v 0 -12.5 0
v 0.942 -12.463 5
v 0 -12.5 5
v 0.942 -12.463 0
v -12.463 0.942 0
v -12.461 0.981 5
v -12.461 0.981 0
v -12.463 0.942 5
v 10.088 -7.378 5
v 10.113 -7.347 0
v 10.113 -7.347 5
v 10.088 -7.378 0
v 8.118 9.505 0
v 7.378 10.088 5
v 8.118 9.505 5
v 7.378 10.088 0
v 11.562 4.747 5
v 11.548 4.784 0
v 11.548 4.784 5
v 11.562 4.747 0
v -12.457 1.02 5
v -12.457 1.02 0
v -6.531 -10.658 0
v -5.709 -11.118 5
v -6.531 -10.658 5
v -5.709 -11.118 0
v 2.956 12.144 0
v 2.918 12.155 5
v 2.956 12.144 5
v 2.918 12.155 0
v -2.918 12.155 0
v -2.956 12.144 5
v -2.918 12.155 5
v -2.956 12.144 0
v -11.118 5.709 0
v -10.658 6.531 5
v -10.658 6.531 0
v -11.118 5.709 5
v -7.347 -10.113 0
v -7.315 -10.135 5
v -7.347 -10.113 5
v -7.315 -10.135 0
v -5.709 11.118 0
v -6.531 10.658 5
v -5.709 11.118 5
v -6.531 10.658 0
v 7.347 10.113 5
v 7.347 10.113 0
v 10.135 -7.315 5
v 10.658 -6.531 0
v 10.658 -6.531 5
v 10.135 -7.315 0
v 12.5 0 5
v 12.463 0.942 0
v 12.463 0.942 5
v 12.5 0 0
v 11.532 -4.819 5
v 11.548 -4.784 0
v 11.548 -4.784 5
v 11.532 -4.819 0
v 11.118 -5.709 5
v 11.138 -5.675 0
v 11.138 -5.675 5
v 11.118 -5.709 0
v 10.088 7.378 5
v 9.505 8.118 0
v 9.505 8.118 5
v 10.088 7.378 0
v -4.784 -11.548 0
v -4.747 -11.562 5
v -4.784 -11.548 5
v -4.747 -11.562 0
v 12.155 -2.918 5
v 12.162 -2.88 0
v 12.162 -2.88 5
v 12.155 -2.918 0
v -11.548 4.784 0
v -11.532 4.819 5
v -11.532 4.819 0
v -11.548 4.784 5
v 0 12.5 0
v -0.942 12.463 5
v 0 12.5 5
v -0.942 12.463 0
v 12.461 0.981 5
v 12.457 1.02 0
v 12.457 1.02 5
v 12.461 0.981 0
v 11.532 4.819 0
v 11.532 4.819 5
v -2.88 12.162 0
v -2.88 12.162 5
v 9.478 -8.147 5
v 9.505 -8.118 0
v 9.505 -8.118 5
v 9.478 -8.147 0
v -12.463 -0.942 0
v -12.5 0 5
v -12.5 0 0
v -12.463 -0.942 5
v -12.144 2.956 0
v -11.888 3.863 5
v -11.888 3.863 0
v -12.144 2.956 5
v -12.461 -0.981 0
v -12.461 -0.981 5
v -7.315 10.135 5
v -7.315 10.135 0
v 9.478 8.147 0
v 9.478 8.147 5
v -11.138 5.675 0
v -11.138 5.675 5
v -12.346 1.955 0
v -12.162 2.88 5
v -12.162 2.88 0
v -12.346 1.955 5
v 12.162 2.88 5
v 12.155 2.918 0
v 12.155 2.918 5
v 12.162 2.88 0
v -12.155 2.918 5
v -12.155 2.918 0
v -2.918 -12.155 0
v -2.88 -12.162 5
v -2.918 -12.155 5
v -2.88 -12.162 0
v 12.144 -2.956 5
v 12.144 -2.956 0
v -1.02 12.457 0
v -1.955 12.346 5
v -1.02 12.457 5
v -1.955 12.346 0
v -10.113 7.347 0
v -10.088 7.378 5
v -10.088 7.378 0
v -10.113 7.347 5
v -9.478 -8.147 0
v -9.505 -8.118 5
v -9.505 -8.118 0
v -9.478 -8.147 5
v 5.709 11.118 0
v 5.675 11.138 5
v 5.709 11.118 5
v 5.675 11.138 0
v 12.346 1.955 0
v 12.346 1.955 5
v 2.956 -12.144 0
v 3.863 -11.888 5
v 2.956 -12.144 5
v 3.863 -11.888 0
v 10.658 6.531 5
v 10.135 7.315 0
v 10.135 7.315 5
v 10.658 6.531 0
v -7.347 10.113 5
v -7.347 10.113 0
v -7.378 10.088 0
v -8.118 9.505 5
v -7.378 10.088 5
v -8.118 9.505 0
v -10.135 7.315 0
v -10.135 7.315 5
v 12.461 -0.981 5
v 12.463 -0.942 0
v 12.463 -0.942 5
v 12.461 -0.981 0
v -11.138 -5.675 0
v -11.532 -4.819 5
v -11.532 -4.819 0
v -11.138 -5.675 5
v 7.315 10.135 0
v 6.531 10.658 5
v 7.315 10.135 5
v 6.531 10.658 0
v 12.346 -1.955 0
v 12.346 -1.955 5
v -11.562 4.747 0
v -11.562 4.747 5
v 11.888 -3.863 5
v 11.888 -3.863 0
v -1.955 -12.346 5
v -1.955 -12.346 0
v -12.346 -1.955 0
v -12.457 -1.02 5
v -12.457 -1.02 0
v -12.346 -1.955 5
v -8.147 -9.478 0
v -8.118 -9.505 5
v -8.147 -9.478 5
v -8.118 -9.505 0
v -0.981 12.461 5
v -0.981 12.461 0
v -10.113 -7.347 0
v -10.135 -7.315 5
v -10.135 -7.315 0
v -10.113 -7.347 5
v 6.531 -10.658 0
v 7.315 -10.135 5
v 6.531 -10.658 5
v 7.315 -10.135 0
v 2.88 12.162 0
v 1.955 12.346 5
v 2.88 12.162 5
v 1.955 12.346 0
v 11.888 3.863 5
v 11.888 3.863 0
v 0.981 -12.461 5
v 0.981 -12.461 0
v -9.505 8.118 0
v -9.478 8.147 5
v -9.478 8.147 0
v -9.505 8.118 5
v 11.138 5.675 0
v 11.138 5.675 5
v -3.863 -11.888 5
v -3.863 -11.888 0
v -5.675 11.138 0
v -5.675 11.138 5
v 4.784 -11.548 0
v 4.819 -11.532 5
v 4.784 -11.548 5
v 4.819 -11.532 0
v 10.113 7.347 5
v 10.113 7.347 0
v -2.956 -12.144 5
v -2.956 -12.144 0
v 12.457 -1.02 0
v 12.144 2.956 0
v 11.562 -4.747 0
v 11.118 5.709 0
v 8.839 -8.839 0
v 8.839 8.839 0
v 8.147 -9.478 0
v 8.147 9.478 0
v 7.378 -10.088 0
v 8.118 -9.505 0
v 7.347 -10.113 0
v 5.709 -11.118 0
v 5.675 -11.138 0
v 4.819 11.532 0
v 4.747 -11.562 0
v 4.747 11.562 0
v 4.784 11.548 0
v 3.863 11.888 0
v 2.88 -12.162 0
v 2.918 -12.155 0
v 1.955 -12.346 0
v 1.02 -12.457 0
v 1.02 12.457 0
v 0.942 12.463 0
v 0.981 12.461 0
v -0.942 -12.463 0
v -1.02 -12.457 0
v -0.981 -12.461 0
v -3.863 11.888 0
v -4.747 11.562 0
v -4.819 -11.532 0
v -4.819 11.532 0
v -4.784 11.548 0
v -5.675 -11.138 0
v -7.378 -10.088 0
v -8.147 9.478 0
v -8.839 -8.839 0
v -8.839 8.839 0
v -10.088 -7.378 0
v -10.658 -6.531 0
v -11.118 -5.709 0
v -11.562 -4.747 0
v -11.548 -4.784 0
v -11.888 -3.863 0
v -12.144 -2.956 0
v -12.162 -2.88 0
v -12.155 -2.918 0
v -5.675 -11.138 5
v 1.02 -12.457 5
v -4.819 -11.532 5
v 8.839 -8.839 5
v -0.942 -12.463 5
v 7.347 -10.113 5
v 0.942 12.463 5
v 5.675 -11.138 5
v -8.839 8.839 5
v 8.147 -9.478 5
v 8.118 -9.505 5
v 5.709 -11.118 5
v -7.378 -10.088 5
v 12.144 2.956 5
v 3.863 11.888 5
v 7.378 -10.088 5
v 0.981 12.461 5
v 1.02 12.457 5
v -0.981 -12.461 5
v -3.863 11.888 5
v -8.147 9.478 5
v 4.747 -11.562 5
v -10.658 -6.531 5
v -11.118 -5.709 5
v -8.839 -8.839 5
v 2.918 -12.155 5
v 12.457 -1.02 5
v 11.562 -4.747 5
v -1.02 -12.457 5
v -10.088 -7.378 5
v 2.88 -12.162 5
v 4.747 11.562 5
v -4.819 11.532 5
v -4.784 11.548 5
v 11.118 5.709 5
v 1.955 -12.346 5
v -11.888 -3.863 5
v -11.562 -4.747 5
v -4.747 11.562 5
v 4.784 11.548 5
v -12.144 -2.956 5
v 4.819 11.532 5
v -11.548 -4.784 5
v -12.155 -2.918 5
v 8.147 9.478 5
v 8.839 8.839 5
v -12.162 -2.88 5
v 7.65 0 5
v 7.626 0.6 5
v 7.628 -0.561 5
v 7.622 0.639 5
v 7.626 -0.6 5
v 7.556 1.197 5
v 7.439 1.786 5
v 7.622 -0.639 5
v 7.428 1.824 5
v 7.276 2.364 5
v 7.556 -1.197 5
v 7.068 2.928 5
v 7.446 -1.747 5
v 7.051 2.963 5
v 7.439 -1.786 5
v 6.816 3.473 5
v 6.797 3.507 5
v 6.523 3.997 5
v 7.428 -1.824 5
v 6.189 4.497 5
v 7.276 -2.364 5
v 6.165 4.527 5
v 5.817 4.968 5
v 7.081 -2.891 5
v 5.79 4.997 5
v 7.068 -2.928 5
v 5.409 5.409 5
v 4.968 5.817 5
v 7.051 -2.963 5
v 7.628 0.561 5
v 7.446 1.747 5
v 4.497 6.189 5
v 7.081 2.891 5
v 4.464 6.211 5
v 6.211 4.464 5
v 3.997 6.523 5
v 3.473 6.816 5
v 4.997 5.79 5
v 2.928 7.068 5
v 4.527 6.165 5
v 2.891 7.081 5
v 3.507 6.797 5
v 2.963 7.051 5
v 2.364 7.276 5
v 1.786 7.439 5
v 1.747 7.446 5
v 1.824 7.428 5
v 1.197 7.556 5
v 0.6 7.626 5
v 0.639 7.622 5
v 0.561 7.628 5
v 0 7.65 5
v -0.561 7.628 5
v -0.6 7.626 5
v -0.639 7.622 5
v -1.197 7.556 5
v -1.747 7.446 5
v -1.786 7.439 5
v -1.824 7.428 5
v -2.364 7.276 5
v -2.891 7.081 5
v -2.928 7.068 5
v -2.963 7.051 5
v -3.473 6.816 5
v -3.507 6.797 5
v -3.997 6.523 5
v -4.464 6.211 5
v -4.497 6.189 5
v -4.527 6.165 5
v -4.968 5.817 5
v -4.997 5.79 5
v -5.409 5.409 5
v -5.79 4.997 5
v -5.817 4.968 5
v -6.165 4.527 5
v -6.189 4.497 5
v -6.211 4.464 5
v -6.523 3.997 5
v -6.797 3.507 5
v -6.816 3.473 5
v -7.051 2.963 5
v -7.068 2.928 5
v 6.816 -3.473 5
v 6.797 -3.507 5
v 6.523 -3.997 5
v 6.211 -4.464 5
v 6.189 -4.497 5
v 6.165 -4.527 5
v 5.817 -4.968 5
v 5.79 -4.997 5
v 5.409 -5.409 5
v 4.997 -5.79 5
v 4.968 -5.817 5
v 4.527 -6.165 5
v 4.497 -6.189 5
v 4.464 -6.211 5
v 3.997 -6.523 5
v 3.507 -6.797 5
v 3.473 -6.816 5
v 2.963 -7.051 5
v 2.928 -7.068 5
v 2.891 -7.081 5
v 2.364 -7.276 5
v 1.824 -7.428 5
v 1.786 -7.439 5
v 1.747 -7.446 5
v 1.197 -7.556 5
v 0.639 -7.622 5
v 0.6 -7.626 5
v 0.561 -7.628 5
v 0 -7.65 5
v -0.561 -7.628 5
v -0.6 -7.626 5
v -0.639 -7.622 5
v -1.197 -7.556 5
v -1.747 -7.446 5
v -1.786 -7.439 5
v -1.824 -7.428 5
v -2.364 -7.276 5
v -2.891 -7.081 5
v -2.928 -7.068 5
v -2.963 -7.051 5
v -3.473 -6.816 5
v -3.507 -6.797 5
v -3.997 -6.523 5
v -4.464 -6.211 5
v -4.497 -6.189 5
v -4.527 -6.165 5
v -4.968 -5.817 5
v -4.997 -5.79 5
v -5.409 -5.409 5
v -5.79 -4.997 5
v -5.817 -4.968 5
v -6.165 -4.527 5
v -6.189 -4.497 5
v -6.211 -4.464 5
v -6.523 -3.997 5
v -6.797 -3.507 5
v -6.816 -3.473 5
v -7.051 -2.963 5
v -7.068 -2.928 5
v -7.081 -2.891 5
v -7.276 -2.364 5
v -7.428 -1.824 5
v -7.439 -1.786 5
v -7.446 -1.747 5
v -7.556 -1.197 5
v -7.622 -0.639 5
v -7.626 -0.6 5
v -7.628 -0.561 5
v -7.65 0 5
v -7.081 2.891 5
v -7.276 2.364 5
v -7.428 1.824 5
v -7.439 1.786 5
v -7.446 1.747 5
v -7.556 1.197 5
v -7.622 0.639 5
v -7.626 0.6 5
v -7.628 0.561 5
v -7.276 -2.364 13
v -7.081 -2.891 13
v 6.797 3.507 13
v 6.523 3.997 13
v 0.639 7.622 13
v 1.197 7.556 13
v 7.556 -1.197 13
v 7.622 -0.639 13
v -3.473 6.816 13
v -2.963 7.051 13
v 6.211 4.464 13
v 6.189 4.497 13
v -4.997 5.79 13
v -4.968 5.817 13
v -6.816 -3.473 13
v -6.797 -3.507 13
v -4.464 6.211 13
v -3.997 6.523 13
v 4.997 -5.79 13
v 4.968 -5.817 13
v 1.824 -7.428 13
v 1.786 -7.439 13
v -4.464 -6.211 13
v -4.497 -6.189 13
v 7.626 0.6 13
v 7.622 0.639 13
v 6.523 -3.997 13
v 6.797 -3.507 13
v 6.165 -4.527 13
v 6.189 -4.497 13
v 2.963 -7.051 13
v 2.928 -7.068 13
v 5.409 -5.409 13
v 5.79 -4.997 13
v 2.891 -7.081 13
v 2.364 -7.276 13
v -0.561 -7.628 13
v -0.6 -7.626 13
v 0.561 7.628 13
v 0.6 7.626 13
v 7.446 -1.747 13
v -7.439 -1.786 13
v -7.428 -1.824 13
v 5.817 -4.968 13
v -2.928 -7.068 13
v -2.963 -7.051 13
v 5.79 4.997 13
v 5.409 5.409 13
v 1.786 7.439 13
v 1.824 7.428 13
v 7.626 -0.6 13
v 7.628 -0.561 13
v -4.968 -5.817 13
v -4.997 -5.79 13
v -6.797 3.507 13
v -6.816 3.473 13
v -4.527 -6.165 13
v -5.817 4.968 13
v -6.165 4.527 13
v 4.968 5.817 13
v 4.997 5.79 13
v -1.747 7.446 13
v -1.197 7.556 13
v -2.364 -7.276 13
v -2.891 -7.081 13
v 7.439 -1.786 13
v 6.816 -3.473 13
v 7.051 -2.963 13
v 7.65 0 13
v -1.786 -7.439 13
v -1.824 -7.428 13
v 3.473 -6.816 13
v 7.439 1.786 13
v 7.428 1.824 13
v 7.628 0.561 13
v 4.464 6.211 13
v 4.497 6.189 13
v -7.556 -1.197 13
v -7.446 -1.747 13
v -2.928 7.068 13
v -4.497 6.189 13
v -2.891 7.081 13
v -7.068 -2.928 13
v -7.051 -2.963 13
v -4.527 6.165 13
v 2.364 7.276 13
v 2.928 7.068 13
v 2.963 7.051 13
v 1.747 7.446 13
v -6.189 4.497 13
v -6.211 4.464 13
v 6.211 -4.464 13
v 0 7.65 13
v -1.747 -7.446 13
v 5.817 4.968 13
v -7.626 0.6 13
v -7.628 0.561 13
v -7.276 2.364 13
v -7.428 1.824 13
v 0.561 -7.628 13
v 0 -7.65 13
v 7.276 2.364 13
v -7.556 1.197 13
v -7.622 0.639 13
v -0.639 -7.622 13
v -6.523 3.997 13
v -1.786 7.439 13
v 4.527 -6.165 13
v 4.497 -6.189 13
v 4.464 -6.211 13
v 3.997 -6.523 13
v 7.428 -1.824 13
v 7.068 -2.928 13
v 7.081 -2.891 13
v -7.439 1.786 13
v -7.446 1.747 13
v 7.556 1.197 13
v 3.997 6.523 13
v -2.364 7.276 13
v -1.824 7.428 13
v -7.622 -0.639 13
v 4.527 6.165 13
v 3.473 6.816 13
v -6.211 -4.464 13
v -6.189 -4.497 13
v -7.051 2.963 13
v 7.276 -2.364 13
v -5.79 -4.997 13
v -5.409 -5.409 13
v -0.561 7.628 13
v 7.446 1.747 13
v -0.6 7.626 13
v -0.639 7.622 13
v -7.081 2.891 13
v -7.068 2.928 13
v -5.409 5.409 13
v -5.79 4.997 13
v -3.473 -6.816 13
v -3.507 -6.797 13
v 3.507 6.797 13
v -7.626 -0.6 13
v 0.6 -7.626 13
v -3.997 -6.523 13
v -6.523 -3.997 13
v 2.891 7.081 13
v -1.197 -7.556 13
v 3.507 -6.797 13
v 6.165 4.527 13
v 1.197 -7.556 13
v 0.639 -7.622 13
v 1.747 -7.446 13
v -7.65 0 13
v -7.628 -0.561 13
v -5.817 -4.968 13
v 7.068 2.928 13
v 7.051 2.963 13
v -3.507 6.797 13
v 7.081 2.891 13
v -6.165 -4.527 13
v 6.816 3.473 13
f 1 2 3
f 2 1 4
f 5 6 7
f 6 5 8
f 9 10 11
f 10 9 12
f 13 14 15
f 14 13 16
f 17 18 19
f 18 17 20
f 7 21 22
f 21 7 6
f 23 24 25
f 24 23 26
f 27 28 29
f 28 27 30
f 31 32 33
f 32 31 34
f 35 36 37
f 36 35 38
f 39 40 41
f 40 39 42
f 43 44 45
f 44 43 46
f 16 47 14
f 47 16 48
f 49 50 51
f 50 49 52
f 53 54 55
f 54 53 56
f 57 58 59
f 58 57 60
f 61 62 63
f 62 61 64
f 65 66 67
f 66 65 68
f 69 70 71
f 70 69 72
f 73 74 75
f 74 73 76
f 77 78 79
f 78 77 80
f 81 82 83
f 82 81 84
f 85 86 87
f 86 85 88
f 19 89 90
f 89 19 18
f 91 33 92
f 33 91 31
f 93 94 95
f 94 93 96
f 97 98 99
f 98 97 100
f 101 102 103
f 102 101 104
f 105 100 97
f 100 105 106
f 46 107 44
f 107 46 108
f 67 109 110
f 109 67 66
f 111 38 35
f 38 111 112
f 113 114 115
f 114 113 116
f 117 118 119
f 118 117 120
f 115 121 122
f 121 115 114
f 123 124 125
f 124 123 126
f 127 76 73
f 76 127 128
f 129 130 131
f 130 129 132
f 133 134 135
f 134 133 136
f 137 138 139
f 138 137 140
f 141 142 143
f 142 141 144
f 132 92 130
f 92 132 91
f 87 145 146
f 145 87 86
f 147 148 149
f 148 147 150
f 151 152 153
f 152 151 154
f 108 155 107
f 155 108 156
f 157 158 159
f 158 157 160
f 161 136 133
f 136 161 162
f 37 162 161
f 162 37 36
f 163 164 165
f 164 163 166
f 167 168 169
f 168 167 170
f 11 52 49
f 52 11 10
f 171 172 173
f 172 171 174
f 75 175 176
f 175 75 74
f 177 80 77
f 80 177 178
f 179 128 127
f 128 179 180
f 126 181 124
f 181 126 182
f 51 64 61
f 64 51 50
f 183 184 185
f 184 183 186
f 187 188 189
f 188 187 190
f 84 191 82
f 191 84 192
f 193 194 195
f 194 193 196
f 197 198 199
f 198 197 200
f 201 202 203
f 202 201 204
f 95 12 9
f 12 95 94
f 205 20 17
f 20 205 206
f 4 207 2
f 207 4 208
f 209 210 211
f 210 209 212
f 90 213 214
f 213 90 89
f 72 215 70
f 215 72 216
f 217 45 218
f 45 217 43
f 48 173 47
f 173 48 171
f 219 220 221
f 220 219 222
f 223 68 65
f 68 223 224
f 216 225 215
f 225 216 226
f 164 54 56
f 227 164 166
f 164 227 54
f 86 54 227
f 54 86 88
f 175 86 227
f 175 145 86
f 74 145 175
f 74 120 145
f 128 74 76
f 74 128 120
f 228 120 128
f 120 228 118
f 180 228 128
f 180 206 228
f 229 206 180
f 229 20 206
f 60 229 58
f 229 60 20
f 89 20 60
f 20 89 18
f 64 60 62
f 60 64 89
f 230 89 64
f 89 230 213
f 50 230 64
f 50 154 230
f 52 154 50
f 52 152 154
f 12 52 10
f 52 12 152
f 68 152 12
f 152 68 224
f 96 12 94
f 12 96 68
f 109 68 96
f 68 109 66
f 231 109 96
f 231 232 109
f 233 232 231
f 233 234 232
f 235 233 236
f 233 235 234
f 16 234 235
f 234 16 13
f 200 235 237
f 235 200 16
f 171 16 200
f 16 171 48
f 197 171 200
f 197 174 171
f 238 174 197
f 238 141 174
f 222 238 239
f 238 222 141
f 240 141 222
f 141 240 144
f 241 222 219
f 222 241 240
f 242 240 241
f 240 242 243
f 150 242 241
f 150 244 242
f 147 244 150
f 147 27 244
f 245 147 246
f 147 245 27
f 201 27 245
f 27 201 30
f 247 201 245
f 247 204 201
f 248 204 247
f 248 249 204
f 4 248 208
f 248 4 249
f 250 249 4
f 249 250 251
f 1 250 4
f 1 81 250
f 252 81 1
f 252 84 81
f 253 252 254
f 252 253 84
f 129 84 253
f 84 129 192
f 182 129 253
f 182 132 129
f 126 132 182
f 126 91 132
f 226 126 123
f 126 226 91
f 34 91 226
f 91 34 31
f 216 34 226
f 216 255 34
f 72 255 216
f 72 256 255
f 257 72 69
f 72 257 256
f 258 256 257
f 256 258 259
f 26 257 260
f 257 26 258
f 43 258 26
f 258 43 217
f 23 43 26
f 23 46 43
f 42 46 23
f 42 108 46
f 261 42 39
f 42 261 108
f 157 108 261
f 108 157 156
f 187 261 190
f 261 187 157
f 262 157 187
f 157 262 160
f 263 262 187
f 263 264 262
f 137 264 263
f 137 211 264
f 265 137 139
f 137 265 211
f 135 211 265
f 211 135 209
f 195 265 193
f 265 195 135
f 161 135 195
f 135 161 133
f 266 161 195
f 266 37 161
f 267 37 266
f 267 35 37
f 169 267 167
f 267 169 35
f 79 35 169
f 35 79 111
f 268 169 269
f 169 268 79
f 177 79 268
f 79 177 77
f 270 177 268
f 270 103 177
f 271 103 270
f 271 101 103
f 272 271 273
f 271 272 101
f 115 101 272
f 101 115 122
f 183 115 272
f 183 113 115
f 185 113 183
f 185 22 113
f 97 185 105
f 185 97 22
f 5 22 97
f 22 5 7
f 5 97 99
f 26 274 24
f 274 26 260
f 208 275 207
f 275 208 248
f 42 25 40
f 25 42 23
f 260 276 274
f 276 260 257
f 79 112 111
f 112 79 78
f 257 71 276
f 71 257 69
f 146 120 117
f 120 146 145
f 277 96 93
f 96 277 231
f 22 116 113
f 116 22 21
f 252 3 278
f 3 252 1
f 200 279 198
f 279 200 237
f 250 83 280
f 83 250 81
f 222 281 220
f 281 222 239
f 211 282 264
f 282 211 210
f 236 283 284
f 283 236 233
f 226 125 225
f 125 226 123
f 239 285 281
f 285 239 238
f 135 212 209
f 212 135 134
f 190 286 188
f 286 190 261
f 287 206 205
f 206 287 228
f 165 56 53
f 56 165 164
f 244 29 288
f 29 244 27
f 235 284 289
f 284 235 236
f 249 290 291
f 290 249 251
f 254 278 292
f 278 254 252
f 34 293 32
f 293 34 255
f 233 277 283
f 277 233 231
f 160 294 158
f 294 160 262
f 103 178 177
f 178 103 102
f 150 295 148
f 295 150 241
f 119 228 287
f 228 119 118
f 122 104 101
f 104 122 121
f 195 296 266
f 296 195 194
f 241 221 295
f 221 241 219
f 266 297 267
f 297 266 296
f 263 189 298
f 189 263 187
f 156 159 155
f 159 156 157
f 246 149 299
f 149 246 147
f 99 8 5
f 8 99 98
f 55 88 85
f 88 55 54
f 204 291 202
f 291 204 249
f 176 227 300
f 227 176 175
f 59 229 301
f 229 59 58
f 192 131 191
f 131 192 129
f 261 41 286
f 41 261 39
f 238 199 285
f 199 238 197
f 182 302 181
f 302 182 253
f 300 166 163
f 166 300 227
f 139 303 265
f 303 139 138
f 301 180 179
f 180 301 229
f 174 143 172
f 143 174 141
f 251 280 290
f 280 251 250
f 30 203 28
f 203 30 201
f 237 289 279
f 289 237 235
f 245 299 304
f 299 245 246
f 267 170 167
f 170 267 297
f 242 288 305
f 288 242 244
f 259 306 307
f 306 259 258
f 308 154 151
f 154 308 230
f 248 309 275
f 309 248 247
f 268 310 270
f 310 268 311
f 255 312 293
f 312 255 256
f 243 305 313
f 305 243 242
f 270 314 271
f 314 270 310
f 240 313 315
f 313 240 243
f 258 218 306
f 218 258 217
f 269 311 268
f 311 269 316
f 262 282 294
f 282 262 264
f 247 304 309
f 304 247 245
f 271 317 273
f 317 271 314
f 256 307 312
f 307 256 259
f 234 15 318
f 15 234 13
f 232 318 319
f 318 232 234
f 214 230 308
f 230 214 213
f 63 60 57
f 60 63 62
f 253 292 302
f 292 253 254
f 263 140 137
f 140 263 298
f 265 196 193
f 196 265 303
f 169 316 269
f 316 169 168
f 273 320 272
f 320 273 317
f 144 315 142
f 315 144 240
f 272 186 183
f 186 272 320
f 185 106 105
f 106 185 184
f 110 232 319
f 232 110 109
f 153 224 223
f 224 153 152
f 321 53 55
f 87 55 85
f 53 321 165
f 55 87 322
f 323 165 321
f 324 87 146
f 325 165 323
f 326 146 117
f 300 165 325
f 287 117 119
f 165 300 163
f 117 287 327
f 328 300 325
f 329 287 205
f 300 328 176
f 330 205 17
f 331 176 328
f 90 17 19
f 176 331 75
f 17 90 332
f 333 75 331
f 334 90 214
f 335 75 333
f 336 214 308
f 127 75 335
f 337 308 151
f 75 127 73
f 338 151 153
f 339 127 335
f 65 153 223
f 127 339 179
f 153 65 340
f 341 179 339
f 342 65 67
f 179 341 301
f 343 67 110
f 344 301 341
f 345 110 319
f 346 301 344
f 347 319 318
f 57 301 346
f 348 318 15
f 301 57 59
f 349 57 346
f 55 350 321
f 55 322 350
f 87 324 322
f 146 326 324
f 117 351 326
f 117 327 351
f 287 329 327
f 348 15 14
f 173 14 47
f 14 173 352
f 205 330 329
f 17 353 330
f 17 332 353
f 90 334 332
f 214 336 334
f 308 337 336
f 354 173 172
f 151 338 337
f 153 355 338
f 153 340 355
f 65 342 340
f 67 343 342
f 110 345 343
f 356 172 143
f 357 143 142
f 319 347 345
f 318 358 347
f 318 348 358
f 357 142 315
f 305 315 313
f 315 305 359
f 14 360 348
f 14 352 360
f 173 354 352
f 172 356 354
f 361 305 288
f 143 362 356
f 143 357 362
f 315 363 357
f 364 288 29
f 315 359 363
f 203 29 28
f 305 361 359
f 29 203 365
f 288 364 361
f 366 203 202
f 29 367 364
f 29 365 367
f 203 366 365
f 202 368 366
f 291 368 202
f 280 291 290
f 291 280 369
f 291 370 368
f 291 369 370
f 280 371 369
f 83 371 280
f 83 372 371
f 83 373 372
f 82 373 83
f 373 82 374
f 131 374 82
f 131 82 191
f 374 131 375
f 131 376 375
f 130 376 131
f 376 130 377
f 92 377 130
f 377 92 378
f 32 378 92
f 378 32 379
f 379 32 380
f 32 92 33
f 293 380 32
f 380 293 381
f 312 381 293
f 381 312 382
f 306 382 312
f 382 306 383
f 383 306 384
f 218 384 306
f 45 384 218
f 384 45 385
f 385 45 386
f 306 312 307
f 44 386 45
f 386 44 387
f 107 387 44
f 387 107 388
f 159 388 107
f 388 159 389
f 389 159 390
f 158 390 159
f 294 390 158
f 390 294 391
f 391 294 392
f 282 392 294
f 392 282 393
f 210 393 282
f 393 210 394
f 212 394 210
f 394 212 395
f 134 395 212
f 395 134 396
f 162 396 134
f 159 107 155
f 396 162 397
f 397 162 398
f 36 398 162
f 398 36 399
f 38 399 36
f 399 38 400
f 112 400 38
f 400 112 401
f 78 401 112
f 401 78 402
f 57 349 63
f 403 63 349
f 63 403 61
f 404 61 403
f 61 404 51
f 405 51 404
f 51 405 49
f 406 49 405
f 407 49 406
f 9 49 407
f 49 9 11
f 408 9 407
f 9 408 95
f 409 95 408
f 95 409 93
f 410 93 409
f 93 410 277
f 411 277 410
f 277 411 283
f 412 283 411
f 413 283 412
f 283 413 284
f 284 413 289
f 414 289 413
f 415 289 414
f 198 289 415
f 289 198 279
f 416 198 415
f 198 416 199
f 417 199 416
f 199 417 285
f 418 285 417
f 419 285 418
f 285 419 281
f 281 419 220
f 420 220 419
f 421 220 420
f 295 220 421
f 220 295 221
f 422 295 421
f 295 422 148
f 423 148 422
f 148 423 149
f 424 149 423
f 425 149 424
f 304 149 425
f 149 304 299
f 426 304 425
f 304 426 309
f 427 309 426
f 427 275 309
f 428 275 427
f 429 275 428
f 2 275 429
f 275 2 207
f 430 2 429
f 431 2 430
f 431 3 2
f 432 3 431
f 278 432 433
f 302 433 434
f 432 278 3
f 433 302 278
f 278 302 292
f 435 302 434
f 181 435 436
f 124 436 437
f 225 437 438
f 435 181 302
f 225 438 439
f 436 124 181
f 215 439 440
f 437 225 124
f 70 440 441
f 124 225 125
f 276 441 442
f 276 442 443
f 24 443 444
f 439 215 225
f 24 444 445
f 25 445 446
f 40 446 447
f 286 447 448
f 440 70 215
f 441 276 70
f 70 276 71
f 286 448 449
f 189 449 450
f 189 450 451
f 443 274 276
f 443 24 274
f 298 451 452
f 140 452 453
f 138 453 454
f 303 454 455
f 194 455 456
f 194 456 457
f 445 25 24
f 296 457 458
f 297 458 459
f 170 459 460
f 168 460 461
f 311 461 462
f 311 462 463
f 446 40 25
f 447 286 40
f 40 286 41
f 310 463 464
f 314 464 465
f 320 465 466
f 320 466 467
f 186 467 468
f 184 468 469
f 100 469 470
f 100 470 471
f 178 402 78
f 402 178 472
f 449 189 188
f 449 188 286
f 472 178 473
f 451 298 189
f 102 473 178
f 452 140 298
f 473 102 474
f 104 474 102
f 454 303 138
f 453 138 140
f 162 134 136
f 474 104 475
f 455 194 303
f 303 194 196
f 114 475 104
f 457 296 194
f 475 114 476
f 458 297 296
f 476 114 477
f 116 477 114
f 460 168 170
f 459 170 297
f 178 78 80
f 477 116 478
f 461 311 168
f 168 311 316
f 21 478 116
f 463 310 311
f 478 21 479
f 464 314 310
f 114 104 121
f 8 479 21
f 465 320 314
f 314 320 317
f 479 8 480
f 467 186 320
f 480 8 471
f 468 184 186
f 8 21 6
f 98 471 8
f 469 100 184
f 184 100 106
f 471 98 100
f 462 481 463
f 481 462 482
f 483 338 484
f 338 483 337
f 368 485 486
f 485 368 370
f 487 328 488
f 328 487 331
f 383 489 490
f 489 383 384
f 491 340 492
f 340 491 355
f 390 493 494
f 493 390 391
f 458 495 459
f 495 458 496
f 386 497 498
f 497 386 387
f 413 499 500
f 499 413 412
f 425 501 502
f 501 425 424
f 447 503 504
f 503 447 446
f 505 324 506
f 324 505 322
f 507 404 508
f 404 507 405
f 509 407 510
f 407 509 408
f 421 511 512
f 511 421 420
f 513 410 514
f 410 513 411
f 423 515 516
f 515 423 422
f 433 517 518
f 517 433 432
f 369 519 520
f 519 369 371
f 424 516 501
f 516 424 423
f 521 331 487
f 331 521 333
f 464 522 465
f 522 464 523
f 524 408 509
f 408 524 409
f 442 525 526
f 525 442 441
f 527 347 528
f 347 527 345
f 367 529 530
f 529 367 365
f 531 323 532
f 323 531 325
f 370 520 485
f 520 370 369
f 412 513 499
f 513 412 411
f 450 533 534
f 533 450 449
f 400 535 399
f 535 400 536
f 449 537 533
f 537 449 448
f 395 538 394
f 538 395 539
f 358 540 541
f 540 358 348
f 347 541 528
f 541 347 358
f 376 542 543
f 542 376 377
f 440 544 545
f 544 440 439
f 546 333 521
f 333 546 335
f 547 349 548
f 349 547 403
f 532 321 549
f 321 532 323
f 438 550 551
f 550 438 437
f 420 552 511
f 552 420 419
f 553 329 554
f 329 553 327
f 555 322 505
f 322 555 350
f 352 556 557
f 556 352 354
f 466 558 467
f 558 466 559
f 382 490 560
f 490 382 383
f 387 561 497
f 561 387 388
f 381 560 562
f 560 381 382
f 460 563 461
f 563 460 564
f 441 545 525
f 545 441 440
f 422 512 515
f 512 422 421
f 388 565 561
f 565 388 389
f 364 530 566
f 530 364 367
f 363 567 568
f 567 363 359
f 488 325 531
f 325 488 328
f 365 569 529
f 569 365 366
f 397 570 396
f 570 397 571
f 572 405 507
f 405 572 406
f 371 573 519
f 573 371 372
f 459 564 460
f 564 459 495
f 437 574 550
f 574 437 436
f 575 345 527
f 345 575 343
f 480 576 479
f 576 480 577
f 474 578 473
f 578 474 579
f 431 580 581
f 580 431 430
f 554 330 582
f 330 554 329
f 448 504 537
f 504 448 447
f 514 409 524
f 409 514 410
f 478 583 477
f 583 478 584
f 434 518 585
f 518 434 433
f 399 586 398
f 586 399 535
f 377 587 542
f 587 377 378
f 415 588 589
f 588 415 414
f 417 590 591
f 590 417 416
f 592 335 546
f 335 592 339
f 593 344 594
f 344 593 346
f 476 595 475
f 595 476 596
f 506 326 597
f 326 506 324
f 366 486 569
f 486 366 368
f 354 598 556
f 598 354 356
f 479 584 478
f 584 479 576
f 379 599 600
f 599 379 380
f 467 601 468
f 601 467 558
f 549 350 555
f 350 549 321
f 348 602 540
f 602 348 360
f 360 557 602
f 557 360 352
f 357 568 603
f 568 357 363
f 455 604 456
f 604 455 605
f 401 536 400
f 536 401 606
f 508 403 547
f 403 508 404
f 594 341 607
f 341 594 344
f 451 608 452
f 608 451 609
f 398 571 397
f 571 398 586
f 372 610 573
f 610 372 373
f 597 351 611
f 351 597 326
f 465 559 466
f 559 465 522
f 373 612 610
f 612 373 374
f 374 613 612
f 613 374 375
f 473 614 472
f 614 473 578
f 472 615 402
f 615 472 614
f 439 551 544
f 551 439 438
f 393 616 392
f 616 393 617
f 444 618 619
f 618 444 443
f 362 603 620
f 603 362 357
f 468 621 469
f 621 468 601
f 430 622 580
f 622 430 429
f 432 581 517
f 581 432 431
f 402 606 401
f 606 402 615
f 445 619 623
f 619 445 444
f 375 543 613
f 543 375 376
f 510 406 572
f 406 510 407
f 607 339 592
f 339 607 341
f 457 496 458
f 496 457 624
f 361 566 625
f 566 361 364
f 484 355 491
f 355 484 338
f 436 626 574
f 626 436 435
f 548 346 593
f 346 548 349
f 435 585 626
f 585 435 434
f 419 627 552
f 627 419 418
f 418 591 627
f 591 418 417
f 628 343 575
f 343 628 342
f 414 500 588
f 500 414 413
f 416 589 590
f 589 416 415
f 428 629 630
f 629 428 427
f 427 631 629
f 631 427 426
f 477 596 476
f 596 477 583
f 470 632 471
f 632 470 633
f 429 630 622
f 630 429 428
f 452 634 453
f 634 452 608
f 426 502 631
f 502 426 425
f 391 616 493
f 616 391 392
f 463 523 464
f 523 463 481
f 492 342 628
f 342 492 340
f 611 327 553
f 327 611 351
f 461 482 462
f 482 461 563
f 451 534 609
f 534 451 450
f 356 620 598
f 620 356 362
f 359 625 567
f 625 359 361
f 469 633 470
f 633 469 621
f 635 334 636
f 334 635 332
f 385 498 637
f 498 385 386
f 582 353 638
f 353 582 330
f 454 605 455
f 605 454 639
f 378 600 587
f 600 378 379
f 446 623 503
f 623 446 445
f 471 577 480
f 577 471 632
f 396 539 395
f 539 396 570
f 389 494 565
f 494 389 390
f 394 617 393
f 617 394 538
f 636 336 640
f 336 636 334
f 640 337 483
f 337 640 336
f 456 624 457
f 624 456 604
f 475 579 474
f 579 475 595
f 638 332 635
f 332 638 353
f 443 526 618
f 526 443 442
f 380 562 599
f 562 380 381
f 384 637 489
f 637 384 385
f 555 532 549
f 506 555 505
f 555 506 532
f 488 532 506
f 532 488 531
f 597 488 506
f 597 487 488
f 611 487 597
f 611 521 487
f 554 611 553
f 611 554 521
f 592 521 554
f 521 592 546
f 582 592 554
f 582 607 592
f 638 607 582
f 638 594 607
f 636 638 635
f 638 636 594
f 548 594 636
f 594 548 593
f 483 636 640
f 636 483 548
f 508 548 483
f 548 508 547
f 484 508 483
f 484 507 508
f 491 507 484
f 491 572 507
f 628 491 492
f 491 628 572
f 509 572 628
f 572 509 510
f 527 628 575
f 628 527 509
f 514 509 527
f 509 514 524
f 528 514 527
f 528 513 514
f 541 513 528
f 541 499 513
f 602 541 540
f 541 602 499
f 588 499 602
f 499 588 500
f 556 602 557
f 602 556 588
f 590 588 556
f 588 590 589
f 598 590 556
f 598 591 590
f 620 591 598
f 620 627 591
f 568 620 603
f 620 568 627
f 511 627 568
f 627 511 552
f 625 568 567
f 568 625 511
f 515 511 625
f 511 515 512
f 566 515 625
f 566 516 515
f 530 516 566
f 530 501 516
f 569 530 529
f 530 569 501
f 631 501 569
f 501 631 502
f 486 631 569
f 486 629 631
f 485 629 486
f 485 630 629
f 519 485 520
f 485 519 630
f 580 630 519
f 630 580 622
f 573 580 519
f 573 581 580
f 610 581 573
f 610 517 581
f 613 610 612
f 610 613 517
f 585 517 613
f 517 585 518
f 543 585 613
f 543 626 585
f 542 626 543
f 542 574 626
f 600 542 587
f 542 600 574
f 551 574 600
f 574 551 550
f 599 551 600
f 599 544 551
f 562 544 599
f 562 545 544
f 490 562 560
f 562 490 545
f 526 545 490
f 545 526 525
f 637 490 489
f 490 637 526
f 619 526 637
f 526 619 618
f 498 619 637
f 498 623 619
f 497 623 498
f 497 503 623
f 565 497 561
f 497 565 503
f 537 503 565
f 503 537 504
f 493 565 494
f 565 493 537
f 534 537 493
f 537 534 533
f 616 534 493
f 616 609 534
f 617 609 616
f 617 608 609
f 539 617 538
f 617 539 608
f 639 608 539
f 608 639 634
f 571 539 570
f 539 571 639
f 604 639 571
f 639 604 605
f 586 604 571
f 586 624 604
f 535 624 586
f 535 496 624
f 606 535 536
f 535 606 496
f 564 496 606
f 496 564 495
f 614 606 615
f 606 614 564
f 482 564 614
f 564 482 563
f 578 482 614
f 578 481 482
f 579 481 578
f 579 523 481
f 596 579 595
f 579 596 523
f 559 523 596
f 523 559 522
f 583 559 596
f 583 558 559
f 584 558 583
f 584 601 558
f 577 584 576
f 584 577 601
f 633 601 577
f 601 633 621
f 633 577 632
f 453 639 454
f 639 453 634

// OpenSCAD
// --- Parametric Variables ---
// (All dimensions are in millimeters)
// OpenSCad code by Dr Evangelos Himonides 2026

/* [Top Cylinder (The "Crown")] */
top_diameter   = 15.3; 
top_height     = 8.0;
top_fillet     = 0.5;   // Radius of the top edge rounding (0 for sharp edge)

/* [Bottom Cylinder (The "Brim")] */
brim_diameter  = 25.0;
brim_thickness = 5.0;
brim_fillet    = 0.5;   // Radius of the brim edge rounding (0 for sharp edge)

/* [Rendering Quality] */
$fn = 80; // Smoothness of curves (Note: Minkowski can be slow if this is too high)


// --- Main Module ---
module top_hat_plug() {
    union() {
        // 1. The Brim (Bottom part)
        if (brim_fillet > 0) {
            // Apply fillet to the top outer edge of the brim
            minkowski() {
                cylinder(
                    h = brim_thickness - brim_fillet, 
                    d = brim_diameter - (2 * brim_fillet), 
                    center = false
                );
                // The rounding shape (shifted so the bottom remains flat)
                cylinder(h = brim_fillet, r = brim_fillet);
            }
        } else {
            cylinder(h = brim_thickness, d = brim_diameter, center = false);
        }
        
        // 2. The Top Part (Stacked on top of the brim)
        translate([0, 0, brim_thickness]) {
            if (top_fillet > 0) {
                // Apply fillet to the top outer edge of the crown
                minkowski() {
                    cylinder(
                        h = top_height - top_fillet, 
                        d = top_diameter - (2 * top_fillet), 
                        center = false
                    );
                    // The rounding shape
                    cylinder(h = top_fillet, r = top_fillet);
                }
            } else {
                cylinder(h = top_height, d = top_diameter, center = false);
            }
        }
    }
}

// Render the plug
top_hat_plug();
